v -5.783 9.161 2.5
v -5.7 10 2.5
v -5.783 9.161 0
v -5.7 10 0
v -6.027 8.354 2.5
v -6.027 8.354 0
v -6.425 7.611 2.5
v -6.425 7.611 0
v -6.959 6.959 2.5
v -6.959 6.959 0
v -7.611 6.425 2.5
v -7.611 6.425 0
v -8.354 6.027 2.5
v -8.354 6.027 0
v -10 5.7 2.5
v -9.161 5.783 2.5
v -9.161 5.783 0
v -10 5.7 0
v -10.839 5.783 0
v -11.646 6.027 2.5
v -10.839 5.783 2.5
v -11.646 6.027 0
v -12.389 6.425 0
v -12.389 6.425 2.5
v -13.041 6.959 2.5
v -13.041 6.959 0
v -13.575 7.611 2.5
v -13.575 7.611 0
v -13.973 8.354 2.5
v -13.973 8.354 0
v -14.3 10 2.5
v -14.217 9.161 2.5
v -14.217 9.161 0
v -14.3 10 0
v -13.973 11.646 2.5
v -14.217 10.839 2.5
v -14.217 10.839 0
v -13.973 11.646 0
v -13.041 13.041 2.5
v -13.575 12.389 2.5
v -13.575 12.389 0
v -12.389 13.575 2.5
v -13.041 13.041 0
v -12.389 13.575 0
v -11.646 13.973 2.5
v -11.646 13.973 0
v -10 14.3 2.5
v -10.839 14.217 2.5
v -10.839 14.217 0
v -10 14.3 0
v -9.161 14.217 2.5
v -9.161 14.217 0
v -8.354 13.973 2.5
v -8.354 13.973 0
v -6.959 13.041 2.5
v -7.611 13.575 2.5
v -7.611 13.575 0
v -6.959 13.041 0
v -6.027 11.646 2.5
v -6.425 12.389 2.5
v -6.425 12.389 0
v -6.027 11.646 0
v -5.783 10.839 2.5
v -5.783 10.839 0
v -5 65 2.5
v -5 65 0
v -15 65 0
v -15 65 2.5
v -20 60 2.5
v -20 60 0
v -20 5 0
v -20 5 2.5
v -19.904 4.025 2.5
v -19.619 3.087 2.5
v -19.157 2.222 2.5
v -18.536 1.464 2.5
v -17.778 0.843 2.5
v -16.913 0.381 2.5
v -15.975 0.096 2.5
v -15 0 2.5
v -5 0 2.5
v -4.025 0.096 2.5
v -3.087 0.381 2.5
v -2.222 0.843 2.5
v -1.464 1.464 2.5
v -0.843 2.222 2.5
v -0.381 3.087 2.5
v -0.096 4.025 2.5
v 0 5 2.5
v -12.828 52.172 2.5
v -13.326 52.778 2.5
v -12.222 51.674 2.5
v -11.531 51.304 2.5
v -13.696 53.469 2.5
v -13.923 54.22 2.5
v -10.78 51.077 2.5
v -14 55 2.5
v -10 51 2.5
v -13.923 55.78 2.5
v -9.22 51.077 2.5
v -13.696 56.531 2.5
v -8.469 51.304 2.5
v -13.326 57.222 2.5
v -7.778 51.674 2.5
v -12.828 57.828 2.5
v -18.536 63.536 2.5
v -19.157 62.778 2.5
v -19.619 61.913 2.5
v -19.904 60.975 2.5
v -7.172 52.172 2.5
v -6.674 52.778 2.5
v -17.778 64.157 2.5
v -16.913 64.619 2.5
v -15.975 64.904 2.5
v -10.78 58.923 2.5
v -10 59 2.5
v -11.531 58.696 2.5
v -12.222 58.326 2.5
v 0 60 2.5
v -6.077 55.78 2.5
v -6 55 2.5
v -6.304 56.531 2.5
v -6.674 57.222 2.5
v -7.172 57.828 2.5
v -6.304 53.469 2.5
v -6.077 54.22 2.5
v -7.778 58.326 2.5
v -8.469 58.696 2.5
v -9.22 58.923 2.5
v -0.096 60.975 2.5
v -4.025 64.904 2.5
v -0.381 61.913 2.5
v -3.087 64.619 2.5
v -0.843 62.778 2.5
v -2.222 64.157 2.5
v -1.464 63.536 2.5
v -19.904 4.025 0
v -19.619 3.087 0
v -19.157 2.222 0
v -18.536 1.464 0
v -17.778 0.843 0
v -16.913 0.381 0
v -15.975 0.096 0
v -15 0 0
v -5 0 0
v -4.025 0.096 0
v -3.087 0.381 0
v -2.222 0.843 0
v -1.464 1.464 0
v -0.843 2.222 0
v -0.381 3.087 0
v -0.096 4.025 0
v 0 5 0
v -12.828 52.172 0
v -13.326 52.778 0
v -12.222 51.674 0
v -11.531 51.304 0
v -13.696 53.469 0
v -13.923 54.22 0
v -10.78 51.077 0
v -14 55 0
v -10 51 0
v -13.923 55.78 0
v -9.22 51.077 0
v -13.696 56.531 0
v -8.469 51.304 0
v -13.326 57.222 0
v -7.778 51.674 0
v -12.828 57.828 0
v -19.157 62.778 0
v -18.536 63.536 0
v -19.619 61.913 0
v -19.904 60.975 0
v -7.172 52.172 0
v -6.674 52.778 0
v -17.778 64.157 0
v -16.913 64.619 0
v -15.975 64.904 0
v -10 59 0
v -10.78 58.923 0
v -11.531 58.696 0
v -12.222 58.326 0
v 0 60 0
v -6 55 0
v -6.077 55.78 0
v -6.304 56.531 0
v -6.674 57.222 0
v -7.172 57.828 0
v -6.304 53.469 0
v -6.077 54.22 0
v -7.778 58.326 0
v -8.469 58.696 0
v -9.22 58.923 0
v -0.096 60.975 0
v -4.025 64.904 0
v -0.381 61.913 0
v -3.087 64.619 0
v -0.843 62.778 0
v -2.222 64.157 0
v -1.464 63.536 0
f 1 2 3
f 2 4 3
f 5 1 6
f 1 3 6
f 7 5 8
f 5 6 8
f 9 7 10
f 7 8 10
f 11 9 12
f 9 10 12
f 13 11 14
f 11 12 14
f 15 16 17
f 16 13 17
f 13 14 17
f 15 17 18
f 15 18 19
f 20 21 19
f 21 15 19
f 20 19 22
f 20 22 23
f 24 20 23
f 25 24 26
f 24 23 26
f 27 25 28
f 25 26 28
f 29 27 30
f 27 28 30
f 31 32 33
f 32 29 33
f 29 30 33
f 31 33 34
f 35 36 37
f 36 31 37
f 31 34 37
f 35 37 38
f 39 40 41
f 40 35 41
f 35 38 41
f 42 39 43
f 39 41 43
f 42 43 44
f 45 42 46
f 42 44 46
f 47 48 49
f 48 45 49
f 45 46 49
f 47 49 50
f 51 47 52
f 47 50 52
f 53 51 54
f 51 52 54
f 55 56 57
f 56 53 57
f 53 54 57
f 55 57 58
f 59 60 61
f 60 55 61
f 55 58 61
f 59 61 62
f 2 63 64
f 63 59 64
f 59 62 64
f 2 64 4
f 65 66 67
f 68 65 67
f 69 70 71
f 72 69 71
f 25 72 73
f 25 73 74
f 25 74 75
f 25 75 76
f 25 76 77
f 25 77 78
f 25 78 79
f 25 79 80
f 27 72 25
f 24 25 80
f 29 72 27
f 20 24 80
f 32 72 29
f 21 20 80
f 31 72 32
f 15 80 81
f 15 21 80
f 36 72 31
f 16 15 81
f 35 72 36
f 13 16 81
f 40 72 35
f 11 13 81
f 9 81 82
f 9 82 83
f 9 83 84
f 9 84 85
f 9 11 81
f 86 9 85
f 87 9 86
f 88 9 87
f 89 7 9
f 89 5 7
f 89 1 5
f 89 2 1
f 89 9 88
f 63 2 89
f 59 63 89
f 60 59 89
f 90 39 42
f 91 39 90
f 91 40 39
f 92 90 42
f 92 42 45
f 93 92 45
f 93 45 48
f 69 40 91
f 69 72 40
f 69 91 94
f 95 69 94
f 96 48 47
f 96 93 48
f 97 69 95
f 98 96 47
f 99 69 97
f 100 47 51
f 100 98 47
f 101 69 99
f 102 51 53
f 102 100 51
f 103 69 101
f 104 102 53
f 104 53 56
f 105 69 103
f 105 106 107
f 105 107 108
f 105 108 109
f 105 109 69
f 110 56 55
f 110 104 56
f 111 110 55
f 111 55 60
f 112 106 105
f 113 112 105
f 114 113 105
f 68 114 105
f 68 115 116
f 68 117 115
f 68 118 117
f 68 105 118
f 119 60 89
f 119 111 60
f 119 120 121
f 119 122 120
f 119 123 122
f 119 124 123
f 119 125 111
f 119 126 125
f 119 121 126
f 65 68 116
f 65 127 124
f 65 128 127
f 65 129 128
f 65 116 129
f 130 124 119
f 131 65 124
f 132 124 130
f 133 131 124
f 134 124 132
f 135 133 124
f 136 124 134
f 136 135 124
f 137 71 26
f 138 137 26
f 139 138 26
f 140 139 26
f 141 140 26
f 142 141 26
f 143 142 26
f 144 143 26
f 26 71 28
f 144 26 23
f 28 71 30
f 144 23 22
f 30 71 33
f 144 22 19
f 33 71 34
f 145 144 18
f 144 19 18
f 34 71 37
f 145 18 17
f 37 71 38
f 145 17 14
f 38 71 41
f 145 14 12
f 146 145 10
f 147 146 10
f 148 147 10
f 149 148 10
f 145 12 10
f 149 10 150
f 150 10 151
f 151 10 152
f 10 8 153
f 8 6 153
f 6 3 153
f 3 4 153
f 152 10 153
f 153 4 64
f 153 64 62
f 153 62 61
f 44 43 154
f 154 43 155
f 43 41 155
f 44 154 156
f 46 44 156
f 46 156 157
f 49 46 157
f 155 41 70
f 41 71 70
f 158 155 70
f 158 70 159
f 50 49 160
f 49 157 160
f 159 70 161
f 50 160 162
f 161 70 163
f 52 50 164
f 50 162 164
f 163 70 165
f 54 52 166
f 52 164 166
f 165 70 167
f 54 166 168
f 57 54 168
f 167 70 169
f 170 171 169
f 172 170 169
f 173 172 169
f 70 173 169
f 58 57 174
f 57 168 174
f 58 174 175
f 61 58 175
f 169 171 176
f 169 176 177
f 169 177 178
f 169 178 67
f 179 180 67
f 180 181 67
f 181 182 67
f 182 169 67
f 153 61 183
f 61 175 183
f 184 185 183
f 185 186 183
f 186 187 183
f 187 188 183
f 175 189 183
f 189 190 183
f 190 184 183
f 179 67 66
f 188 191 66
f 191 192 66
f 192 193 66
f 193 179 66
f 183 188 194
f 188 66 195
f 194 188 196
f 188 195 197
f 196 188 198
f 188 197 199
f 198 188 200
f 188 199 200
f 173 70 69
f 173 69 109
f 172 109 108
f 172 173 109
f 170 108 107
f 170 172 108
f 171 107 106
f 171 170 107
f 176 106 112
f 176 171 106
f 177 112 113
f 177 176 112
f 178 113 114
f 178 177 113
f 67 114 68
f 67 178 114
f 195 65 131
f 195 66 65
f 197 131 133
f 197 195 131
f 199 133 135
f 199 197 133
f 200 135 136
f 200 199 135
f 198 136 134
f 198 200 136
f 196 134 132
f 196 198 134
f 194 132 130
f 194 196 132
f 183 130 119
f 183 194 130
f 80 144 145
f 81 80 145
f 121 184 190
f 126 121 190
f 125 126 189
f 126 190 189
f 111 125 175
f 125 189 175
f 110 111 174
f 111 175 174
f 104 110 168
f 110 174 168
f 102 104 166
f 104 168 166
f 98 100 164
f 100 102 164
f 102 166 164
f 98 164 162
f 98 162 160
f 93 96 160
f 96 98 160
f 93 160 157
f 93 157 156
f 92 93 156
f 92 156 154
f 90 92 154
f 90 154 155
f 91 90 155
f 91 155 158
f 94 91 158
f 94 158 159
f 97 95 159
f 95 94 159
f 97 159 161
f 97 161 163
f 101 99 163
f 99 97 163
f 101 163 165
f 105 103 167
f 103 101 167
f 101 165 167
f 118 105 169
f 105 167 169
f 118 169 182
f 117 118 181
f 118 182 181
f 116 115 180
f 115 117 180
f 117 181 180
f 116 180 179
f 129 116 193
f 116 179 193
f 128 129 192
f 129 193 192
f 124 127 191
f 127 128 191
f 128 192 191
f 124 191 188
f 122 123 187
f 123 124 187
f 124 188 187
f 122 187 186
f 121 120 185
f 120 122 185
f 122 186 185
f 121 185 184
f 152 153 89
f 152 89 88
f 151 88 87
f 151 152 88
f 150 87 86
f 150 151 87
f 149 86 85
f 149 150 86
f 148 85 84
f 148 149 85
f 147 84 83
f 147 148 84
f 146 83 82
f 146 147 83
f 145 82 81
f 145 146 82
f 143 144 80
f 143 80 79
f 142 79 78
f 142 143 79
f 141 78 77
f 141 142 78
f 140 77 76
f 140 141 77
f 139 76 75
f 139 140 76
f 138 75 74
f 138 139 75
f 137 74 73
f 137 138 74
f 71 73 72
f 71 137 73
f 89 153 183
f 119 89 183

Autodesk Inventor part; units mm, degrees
ref_plane "YZ Plane" through (0, 0, 0) normal (1, 0, 0) x (0, 1, 0)
ref_plane "XZ Plane" through (0, 0, 0) normal (0, 1, 0) x (-1, 0, 0)
ref_plane "XY Plane" through (0, 0, 0) normal (0, 0, 1) x (1, 0, 0)
sketch "Sketch1" plane through (0, 0, 0) normal (0, 0, 1) x (1, 0, 0)
  line L0 (-5, 65) -> (-15, 65)
  arc A0 (-15, 65) -> (-20, 60) centre (-15, 60) ccw
  line L1 (-20, 60) -> (-20, 5)
  arc A1 (-20, 5) -> (-15, 0) centre (-15, 5) ccw
  line L2 (-15, 0) -> (-5, 0)
  arc A2 (-5, 0) -> (0, 5) centre (-5, 5) ccw
  line L3 (0, 5) -> (0, 60)
  arc A3 (0, 60) -> (-5, 65) centre (-5, 60) ccw
  circle A4 centre (-10, 10) radius 4.3
  circle A5 centre (-10, 55) radius 4
  point P0 (0, 0)
  point P1 (0, 0)
  dimension "d0" = 8
  dimension "d1" = 8.6
extrude "Plate1" add sketch "Sketch1" along normal blind 2.5
equation "\"d2\" = Thickness"
equation "\"BendRadius\" = Thickness"
equation "\"BendReliefWidth\" = Thickness"
equation "\"BendReliefDepth\" = 0.5 * Thickness"
equation "\"MinimumRemnant\" = 2 * Thickness"
equation "\"TransitionRadius\" = BendRadius"
equation "\"JacobiRadiusSize\" = BendRadius"
equation "\"GapSize\" = Thickness"
equation "\"Thickness\" = 2.5"
properties part number "Servo horn"
